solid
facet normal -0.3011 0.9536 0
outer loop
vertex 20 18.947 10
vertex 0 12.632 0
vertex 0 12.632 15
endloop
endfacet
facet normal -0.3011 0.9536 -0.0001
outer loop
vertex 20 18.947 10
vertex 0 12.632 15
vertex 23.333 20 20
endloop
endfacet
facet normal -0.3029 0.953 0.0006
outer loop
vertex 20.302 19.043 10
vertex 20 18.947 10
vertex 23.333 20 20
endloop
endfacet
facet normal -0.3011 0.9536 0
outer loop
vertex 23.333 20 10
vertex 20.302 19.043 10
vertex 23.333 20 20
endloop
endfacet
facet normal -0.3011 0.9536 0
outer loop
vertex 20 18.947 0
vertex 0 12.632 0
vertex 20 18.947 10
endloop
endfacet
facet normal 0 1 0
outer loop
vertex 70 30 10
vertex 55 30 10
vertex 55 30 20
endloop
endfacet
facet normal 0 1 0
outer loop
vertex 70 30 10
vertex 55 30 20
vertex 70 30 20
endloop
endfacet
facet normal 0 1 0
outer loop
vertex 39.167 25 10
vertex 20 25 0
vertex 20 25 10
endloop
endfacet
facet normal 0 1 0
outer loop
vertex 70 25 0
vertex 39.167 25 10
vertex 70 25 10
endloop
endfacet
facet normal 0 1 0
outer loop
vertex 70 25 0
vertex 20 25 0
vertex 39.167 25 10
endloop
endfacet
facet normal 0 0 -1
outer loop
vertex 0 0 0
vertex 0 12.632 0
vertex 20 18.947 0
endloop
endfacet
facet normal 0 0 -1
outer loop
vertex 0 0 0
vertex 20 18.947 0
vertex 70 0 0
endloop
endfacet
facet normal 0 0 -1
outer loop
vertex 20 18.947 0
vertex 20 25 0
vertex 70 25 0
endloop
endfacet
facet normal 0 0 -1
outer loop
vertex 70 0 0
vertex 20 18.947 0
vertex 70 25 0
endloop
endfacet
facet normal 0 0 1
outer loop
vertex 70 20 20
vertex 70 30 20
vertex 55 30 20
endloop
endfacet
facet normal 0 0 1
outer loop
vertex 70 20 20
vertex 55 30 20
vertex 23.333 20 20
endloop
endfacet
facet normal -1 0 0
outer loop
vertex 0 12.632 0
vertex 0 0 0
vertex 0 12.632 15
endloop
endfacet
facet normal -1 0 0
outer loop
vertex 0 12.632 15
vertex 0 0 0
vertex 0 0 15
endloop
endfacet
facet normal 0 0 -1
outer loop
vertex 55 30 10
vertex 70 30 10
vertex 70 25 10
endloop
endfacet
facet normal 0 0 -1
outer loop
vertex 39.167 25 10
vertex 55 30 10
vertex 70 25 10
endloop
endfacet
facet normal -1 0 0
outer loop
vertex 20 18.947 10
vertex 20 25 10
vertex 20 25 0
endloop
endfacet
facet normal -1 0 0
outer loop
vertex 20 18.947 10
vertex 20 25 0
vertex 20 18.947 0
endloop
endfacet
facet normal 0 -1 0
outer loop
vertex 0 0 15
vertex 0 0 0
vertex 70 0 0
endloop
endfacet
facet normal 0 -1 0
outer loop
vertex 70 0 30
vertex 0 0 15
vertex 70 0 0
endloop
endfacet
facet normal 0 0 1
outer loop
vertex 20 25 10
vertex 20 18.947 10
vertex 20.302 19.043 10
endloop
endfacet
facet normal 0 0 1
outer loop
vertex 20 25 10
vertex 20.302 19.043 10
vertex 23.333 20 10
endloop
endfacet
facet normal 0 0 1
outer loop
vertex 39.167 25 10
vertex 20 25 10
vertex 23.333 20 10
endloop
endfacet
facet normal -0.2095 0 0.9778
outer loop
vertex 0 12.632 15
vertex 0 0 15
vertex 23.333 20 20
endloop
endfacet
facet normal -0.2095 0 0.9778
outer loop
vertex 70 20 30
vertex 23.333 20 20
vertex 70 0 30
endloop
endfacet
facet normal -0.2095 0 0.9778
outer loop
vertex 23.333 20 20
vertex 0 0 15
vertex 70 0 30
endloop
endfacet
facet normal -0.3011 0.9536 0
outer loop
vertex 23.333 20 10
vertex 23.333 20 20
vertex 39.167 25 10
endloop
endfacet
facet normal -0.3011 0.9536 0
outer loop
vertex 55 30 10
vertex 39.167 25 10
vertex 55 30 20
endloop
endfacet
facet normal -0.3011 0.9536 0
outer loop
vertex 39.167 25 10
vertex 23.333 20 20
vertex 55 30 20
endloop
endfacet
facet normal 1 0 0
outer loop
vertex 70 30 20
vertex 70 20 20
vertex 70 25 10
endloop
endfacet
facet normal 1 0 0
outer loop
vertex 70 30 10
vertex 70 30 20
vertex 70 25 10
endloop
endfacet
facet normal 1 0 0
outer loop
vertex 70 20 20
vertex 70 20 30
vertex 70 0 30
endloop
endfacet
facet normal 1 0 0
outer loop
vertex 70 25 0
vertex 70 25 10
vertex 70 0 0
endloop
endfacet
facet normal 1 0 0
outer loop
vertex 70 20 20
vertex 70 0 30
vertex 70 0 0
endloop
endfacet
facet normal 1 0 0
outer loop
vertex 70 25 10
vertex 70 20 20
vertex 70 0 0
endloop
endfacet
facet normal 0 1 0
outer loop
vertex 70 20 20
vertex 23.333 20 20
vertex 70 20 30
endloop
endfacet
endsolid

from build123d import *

# Parameters (mm, degrees)
EXTRUDE_1_DEPTH     = 20
SKETCH_2_W          = 15
SKETCH_2_H          = 10
EXTRUDE_2_DEPTH     = 10
SKETCH_3_W          = 50
SKETCH_3_H          = 10
EXTRUDE_3_DEPTH     = 5
EXTRUDE_4_DEPTH     = 10
CUT_EXTRUDE_2_DEPTH = 82.631660278
EXTRUDE_5_DEPTH     = 10


with BuildPart() as part:
    # 草图1 → 凸台-拉伸1 (new body)
    with BuildSketch(Plane(origin=(0, 0, 0), x_dir=(1, 0, 0), z_dir=(0, 1, 0))):
        Polygon((0, 0), (0, -15), (70, -30), (70, 0), align=None)
    extrude(amount=EXTRUDE_1_DEPTH)

    # 草图2 → 凸台-拉伸2 (add)
    with BuildSketch(Plane(origin=(0, 20, 0), x_dir=(1, 0, 0), z_dir=(0, 1, 0))):
        with Locations((62.5, -15)):
            Rectangle(SKETCH_2_W, SKETCH_2_H)
    extrude(amount=EXTRUDE_2_DEPTH)

    # 草图3 → 凸台-拉伸3 (add)
    with BuildSketch(Plane(origin=(0, 20, 0), x_dir=(1, 0, 0), z_dir=(0, 1, 0))):
        with Locations((45, -5)):
            Rectangle(SKETCH_3_W, SKETCH_3_H)
    extrude(amount=EXTRUDE_3_DEPTH)

    # 草图6 → 凸台-拉伸4 (add)
    with BuildSketch(Plane(origin=(0, 0, 20), x_dir=(-1, 0, 0), z_dir=(0, 0, -1))):
        Polygon((-23.333333333, 20), (-55, 30), (-55, 20), align=None)
    extrude(amount=EXTRUDE_4_DEPTH)

    # 草图12 → 切除-拉伸2 (cut, through all)
    with BuildSketch(Plane(origin=(-3.62720403, 11.486146096, 0), x_dir=(0.9535826651341409, 0.30113136793709994, 0), z_dir=(-0.3011313679370999, 0.9535826651341408, 0))):
        Polygon((2.464685971, 0), (2.464685971, -20), (63.372000863, -20), (63.372000863, -10), (25.094280661, -10), (25.094280661, 0), align=None)
    extrude(amount=CUT_EXTRUDE_2_DEPTH, mode=Mode.SUBTRACT)

    # 草图14 → 凸台-拉伸5 (add)
    with BuildSketch(Plane.XY.offset(10)):
        Polygon((20, 20), (20, 18.947368421), (20.304276784, 19.043455826), align=None)
    extrude(amount=-EXTRUDE_5_DEPTH)


solid = part.part
